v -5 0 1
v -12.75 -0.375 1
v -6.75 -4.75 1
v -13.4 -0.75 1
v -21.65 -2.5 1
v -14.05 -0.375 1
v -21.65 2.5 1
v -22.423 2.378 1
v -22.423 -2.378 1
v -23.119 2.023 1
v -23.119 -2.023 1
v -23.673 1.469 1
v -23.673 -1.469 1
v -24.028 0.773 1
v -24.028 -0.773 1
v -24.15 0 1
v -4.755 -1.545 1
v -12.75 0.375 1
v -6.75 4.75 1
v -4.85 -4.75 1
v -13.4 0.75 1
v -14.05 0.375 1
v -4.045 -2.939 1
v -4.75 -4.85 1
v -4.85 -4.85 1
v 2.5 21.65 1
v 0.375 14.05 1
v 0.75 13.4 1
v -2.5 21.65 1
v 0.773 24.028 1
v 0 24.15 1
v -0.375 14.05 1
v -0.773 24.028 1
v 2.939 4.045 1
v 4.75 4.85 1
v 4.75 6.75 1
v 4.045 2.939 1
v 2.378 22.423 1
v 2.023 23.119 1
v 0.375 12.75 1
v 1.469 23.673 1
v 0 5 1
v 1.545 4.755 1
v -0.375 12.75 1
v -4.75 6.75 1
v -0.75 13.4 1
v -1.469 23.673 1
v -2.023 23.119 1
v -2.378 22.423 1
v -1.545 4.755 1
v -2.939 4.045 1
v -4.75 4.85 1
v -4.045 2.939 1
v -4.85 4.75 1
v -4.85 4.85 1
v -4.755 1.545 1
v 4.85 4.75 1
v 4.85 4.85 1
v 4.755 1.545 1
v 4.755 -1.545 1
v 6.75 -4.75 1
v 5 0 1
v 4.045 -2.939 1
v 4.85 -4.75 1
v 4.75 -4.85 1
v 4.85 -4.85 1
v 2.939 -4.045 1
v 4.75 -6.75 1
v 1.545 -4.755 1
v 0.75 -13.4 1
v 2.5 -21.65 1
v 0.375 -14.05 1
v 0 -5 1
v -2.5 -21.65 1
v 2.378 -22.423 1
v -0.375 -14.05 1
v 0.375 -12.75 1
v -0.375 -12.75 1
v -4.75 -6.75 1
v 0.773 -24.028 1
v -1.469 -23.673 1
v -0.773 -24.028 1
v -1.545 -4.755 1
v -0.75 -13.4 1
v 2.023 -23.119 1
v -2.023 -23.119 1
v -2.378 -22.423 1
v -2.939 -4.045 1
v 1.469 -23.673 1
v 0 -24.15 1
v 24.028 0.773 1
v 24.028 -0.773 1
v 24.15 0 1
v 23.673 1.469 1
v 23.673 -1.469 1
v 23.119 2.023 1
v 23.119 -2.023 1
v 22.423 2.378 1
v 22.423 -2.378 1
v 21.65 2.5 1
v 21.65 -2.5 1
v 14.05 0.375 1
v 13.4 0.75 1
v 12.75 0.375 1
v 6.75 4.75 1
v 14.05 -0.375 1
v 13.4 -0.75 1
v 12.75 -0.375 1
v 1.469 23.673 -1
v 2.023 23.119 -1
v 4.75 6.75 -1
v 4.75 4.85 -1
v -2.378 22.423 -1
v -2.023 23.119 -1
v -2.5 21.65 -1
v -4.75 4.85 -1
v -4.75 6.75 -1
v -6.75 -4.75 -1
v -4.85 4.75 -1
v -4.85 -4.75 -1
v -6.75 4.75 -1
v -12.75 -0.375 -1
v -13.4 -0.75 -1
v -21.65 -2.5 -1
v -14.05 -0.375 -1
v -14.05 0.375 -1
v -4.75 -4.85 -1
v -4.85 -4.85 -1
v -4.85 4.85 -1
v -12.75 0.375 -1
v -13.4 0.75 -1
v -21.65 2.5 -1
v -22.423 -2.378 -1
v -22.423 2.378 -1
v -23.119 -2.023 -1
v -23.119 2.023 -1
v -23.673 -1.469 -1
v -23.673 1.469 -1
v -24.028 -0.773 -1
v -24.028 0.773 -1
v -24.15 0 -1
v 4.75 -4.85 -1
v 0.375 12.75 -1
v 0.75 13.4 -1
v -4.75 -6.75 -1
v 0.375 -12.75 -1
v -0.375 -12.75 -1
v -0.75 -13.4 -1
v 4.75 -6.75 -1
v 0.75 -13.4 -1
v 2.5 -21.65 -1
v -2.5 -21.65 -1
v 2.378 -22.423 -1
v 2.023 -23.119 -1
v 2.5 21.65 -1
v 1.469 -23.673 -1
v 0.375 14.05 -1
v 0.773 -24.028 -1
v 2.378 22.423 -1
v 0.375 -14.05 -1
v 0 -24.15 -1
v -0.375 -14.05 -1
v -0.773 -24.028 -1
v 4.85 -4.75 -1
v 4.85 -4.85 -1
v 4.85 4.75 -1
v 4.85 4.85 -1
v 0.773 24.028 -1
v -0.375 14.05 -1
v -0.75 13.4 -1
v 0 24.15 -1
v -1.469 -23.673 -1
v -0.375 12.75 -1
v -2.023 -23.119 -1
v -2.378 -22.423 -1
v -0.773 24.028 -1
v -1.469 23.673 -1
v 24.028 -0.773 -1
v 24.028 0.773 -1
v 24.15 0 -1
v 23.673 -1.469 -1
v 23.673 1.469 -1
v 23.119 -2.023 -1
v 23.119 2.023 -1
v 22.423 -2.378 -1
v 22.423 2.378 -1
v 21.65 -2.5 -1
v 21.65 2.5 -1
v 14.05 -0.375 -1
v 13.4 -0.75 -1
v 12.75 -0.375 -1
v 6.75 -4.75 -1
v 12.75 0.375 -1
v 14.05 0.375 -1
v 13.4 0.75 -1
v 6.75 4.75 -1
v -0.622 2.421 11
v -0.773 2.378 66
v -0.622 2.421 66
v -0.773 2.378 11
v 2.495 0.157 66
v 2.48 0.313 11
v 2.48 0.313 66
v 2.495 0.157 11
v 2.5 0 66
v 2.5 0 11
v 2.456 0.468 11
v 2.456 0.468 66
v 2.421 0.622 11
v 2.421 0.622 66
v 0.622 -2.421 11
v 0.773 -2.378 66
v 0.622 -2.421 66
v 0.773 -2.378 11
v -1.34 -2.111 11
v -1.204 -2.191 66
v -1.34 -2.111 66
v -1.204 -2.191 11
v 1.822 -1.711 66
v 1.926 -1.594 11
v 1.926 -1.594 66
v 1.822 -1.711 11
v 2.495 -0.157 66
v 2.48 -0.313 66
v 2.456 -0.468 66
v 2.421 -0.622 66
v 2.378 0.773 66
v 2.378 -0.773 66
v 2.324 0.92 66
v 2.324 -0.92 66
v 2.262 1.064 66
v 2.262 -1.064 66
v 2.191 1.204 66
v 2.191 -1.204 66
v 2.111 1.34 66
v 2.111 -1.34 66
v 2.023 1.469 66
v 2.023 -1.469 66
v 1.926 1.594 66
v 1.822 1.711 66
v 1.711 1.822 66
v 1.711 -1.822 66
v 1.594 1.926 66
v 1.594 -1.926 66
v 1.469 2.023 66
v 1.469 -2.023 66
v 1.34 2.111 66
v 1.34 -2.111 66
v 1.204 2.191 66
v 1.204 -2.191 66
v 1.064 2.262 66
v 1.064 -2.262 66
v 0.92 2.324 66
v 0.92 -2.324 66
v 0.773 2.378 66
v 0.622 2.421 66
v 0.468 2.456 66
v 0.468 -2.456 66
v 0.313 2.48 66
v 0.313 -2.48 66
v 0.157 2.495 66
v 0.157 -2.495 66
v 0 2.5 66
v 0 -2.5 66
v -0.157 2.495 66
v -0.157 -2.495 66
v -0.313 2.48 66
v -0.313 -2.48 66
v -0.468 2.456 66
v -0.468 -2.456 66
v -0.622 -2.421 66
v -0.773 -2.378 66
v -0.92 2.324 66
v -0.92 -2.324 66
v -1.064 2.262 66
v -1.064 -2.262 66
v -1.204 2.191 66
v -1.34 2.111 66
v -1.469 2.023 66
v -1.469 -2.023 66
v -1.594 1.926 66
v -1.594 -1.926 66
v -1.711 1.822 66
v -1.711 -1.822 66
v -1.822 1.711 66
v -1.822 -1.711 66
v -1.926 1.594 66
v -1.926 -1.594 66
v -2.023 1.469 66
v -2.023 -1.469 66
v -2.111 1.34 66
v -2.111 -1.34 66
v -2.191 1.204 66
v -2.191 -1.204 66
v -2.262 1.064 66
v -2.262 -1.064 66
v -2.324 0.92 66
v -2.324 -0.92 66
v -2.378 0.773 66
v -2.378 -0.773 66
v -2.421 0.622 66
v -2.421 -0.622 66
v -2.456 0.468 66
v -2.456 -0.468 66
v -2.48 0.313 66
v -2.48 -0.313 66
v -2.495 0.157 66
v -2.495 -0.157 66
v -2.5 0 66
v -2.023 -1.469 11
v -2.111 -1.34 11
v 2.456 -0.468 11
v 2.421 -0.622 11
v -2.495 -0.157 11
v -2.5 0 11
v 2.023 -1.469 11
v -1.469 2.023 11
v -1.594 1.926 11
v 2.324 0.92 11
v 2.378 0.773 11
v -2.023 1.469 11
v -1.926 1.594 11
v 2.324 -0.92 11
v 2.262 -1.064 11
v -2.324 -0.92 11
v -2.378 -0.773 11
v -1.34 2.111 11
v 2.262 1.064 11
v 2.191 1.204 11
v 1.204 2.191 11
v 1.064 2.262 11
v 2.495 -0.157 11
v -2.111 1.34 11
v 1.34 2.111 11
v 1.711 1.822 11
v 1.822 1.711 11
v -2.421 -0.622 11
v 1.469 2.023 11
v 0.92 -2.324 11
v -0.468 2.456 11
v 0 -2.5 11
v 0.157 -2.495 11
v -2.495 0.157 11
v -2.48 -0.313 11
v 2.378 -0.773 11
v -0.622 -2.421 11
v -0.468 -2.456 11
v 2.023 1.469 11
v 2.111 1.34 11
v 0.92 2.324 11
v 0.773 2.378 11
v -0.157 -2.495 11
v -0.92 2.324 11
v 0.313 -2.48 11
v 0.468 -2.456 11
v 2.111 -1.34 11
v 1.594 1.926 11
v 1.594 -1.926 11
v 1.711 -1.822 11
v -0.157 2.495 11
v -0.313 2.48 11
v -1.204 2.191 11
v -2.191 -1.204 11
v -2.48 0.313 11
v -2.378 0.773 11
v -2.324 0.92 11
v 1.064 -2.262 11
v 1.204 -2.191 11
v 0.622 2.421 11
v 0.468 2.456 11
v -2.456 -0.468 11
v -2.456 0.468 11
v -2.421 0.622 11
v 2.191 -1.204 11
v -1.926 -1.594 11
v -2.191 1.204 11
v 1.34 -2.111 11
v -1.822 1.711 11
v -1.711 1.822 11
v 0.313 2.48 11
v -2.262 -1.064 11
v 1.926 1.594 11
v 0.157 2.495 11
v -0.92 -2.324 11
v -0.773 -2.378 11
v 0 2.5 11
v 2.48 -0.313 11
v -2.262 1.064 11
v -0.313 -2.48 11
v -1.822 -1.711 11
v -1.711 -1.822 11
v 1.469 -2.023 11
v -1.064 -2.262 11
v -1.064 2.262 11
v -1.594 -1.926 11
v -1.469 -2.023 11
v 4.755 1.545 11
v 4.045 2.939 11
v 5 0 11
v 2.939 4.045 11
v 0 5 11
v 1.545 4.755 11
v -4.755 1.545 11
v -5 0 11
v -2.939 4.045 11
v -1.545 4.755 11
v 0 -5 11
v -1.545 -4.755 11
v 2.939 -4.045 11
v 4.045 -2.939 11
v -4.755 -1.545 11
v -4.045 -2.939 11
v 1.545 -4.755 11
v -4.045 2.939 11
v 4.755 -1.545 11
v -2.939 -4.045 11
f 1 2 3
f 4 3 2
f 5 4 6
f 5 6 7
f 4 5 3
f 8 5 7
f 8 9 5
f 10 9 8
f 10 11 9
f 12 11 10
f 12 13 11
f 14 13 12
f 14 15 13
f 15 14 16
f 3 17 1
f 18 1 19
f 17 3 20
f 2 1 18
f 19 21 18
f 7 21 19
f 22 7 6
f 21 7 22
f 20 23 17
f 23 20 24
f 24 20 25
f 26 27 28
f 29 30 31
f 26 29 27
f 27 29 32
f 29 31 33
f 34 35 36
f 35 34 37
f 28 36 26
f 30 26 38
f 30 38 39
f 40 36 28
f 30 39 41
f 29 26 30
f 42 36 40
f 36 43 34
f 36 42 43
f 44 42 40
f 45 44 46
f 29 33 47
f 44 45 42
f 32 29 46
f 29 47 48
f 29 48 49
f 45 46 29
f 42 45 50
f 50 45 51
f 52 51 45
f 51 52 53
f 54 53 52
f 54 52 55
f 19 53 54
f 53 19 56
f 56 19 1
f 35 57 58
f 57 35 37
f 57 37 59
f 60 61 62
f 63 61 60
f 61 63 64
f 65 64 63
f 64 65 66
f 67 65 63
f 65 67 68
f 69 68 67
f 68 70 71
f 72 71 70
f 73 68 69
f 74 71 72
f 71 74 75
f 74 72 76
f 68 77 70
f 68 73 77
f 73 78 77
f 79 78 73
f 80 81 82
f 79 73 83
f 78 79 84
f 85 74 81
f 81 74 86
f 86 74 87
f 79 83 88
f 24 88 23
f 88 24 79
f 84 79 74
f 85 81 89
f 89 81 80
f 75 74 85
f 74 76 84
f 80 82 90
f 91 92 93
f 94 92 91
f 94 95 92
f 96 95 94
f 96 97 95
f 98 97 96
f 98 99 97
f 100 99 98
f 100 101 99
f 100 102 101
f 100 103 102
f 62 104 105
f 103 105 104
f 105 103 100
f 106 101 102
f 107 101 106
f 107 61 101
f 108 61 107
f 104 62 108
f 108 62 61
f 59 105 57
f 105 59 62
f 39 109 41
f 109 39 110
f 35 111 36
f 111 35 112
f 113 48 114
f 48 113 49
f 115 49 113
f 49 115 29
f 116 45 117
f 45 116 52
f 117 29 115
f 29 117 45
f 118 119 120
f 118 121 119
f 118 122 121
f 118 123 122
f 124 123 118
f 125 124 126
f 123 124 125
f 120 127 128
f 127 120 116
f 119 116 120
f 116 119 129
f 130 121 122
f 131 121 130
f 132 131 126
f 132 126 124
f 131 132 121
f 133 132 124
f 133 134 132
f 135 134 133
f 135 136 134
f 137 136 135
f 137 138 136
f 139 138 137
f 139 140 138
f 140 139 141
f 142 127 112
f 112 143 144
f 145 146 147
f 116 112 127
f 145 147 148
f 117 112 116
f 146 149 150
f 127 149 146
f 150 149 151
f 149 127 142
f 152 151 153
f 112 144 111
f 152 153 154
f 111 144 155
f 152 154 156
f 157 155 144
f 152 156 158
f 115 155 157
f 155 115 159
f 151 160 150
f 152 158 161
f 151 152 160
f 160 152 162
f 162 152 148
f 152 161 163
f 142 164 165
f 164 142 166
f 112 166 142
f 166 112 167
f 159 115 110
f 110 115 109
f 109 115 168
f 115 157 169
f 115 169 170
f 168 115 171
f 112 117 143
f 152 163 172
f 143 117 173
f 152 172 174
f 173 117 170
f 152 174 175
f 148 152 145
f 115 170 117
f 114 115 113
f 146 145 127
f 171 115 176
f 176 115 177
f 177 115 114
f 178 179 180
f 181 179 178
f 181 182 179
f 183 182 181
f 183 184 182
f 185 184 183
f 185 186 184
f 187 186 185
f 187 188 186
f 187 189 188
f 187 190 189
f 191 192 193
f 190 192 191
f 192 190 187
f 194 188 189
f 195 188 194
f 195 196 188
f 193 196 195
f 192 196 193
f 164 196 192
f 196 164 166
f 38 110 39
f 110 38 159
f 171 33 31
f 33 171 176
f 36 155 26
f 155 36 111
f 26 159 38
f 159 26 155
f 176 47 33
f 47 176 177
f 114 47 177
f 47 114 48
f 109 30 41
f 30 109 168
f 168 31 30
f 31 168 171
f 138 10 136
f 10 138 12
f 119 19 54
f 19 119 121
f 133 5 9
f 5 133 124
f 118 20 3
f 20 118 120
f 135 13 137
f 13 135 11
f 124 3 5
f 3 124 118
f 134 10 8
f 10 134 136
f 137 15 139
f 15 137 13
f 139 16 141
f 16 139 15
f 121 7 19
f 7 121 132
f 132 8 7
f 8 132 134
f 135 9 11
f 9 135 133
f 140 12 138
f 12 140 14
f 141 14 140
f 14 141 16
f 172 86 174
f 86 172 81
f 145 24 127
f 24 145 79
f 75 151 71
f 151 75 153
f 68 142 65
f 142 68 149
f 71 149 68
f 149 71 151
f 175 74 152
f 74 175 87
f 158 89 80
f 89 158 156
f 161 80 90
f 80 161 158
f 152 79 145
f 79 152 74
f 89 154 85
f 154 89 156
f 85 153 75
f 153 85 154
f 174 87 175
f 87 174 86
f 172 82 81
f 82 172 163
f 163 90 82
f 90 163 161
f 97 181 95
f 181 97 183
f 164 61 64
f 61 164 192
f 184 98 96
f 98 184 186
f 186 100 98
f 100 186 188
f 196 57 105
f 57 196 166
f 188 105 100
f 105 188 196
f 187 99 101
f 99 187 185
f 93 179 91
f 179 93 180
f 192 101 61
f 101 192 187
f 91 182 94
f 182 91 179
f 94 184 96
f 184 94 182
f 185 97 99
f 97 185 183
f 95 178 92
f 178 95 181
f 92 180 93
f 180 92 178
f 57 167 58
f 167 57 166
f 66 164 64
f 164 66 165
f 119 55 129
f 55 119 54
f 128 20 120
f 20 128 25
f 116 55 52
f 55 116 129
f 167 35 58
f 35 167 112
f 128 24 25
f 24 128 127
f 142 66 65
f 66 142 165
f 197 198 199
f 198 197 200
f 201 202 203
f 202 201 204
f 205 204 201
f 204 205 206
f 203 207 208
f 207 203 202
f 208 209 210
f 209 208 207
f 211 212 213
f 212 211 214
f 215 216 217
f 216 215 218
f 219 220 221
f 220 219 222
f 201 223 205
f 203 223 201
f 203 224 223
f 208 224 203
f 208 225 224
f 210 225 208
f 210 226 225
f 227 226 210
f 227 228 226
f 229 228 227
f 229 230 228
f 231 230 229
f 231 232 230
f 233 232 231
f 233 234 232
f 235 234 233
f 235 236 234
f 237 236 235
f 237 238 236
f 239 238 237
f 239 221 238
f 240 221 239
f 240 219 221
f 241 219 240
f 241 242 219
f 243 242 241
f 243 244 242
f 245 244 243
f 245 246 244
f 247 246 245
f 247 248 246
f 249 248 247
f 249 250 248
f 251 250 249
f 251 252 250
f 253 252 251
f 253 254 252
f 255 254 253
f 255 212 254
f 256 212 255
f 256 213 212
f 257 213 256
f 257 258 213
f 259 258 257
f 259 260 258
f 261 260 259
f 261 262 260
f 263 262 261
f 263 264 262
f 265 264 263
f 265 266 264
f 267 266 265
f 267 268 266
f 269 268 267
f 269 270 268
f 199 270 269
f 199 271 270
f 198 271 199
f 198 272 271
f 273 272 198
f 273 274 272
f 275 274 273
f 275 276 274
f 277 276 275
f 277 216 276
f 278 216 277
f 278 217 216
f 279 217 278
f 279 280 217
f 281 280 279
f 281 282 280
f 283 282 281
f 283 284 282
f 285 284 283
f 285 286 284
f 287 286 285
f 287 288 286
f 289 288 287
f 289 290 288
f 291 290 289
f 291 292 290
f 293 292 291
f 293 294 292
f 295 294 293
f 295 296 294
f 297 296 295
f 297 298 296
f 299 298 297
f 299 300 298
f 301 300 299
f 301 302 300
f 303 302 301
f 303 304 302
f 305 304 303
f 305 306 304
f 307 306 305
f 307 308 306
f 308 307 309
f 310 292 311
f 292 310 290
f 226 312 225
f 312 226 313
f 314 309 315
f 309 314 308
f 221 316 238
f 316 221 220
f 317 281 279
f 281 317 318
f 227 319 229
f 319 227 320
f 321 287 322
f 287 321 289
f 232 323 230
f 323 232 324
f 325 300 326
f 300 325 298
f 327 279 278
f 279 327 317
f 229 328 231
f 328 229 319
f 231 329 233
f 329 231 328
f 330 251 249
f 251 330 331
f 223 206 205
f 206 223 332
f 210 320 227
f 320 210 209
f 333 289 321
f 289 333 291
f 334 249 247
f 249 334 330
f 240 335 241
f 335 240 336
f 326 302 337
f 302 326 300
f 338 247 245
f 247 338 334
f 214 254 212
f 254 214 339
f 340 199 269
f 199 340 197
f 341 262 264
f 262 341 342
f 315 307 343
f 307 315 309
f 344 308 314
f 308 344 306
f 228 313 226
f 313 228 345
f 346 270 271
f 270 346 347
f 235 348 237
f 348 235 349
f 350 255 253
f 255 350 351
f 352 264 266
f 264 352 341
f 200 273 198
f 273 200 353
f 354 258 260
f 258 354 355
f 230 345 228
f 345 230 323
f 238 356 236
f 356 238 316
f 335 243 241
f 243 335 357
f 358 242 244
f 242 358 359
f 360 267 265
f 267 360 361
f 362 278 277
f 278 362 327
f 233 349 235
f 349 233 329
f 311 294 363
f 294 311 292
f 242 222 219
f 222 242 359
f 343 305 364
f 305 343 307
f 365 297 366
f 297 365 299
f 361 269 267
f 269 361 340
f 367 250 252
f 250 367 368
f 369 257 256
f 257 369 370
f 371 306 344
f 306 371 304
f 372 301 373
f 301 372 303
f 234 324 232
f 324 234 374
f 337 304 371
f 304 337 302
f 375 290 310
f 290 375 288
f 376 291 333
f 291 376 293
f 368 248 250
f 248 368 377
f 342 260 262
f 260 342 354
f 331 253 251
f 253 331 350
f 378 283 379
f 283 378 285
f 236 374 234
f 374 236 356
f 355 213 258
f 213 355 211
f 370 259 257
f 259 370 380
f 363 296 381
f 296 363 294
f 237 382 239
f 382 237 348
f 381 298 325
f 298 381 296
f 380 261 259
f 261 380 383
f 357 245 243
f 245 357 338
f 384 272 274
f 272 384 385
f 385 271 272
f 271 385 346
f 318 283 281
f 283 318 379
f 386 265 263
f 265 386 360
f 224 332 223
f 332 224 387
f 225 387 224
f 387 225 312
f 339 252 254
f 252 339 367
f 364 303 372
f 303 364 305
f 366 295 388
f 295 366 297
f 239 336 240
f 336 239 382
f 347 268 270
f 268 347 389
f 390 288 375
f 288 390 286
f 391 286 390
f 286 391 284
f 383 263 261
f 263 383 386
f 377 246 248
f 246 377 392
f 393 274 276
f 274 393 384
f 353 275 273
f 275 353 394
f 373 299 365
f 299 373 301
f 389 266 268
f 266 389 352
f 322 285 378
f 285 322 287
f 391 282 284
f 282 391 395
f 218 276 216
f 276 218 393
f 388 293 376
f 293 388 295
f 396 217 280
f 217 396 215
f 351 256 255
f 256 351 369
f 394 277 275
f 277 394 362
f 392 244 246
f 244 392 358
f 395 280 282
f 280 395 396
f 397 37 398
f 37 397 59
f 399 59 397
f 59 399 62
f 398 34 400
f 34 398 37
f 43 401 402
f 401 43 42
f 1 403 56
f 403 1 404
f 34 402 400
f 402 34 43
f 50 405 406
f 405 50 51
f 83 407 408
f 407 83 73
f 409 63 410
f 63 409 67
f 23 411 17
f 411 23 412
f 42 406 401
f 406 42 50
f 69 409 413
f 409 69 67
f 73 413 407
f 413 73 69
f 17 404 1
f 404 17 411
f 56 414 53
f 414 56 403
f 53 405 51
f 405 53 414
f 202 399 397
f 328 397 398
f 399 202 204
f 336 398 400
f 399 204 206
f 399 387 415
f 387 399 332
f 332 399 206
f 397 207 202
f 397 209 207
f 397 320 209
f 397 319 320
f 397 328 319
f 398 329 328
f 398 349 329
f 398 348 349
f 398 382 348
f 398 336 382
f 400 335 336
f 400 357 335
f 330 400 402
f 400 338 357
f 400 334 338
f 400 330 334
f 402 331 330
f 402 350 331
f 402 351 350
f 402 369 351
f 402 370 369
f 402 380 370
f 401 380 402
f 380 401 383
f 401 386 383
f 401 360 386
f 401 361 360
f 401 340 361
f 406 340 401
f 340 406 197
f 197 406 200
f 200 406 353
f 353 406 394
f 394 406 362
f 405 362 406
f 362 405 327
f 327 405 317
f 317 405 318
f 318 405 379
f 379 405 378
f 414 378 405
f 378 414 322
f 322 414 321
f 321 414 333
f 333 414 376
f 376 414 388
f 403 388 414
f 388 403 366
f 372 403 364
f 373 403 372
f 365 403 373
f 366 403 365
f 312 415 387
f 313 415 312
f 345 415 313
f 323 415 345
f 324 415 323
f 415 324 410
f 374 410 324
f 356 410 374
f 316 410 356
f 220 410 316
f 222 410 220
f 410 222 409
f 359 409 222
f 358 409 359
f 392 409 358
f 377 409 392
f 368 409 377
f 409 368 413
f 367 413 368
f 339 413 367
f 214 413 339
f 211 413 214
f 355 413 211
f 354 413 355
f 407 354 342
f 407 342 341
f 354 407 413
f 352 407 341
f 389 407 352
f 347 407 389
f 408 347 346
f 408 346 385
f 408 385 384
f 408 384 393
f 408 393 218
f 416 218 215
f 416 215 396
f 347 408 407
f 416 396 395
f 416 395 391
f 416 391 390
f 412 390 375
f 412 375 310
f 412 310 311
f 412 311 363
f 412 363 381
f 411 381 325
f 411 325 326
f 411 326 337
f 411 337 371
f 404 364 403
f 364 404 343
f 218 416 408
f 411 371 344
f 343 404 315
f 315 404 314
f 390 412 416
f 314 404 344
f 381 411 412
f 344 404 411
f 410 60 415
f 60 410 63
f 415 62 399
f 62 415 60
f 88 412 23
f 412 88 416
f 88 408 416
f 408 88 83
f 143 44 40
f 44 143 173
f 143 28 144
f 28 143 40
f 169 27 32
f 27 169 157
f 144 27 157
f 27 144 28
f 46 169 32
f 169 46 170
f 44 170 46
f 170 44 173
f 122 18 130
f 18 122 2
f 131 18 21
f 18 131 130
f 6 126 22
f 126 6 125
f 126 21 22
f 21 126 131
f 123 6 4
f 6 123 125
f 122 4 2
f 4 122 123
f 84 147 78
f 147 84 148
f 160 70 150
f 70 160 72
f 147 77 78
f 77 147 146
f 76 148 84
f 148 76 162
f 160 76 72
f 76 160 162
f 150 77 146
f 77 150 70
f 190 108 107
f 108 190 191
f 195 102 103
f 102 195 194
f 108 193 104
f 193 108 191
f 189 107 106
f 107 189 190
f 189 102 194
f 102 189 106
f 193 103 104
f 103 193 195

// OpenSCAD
//-------------------------------------------------------------
//-- Axle and servo 4 horn hub for mobile robots
//-------------------------------------------------------------

//-- Parameters common to all horns
horn_drill_diam   = 1.5;
horn_plate_height = 2;                  //-- plate height

//-- Parallax 900-0008 4-arm horn parameters
a4h_end_diam       = 5;
a4h_center_diam    = 9.5;
a4h_arm_length     = 19.4;
a4h_drill_distance = 13.4;

stop_diam      = 10;
stop_length    = 10;
axle_diam      = 5;
axle_length    = 55+stop_length;

//--------------------------------------------------------------
//-- Generic module for the horn's drills
//-- Parameters:
//--  d = drill's radial distance (from the horn's center)
//--  n = number of drills
//--  h = horn_plate_height
//--------------------------------------------------------------
module horn_drills(d,n,h)
{
  union() {
    for ( i = [0 : n-1] ) {
        rotate([0,0,i*360/n])
        translate([0,d,0])
        cylinder(r=horn_drill_diam/2, h=h+10,center=true, $fn=6);  
      }
  }
}

//-----------------------------------------
//-- Parallax 900-0008 horn4 arm
//-- This module is just one arm
//-----------------------------------------
module horn4_arm(h=5)
{
  translate([0,a4h_arm_length-a4h_end_diam/2,0])
  //-- The arm consist of the perimeter of a cylinder and a cube
  hull() {
    cylinder(r=a4h_end_diam/2, h=h, center=true, $fn=20);
    translate([0,1-a4h_arm_length+a4h_end_diam/2,0])
      cube([a4h_center_diam,2,h],center=true);
  }
}

//-------------------------------------------
//-- Parallax 900-0008 4-arm horn
//-------------------------------------------
module horn4(h=5)
{
  union() {
    //-- Center part (is a square)
    cube([a4h_center_diam+0.2,a4h_center_diam+0.2,h],center=true);

    //-- Place the 4 arms in every side of the cube
    for ( i = [0 : 3] ) {
      rotate( [0,0,i*90])
      translate([0, a4h_center_diam/2, 0])
      horn4_arm(h);
    }
  }
}



//-------------------------------------------------------
//--  An axle with a 4 horn servo hub attached
//--------------------------------------------------------
module axle_and_hub()
{
  difference() {
  
    union() {   
      horn4(h=horn_plate_height);

      // Axle
      cylinder(h=horn_plate_height/2+axle_length, d=axle_diam, $fn=100);
    
      // Stop
      cylinder(h=horn_plate_height/2+stop_length, d=stop_diam, $fn=20);
    }

    //-- Horn drills
    horn_drills(d=a4h_drill_distance, n=4, h=horn_plate_height*2);
  }    
}


//-- Test!
axle_and_hub();
